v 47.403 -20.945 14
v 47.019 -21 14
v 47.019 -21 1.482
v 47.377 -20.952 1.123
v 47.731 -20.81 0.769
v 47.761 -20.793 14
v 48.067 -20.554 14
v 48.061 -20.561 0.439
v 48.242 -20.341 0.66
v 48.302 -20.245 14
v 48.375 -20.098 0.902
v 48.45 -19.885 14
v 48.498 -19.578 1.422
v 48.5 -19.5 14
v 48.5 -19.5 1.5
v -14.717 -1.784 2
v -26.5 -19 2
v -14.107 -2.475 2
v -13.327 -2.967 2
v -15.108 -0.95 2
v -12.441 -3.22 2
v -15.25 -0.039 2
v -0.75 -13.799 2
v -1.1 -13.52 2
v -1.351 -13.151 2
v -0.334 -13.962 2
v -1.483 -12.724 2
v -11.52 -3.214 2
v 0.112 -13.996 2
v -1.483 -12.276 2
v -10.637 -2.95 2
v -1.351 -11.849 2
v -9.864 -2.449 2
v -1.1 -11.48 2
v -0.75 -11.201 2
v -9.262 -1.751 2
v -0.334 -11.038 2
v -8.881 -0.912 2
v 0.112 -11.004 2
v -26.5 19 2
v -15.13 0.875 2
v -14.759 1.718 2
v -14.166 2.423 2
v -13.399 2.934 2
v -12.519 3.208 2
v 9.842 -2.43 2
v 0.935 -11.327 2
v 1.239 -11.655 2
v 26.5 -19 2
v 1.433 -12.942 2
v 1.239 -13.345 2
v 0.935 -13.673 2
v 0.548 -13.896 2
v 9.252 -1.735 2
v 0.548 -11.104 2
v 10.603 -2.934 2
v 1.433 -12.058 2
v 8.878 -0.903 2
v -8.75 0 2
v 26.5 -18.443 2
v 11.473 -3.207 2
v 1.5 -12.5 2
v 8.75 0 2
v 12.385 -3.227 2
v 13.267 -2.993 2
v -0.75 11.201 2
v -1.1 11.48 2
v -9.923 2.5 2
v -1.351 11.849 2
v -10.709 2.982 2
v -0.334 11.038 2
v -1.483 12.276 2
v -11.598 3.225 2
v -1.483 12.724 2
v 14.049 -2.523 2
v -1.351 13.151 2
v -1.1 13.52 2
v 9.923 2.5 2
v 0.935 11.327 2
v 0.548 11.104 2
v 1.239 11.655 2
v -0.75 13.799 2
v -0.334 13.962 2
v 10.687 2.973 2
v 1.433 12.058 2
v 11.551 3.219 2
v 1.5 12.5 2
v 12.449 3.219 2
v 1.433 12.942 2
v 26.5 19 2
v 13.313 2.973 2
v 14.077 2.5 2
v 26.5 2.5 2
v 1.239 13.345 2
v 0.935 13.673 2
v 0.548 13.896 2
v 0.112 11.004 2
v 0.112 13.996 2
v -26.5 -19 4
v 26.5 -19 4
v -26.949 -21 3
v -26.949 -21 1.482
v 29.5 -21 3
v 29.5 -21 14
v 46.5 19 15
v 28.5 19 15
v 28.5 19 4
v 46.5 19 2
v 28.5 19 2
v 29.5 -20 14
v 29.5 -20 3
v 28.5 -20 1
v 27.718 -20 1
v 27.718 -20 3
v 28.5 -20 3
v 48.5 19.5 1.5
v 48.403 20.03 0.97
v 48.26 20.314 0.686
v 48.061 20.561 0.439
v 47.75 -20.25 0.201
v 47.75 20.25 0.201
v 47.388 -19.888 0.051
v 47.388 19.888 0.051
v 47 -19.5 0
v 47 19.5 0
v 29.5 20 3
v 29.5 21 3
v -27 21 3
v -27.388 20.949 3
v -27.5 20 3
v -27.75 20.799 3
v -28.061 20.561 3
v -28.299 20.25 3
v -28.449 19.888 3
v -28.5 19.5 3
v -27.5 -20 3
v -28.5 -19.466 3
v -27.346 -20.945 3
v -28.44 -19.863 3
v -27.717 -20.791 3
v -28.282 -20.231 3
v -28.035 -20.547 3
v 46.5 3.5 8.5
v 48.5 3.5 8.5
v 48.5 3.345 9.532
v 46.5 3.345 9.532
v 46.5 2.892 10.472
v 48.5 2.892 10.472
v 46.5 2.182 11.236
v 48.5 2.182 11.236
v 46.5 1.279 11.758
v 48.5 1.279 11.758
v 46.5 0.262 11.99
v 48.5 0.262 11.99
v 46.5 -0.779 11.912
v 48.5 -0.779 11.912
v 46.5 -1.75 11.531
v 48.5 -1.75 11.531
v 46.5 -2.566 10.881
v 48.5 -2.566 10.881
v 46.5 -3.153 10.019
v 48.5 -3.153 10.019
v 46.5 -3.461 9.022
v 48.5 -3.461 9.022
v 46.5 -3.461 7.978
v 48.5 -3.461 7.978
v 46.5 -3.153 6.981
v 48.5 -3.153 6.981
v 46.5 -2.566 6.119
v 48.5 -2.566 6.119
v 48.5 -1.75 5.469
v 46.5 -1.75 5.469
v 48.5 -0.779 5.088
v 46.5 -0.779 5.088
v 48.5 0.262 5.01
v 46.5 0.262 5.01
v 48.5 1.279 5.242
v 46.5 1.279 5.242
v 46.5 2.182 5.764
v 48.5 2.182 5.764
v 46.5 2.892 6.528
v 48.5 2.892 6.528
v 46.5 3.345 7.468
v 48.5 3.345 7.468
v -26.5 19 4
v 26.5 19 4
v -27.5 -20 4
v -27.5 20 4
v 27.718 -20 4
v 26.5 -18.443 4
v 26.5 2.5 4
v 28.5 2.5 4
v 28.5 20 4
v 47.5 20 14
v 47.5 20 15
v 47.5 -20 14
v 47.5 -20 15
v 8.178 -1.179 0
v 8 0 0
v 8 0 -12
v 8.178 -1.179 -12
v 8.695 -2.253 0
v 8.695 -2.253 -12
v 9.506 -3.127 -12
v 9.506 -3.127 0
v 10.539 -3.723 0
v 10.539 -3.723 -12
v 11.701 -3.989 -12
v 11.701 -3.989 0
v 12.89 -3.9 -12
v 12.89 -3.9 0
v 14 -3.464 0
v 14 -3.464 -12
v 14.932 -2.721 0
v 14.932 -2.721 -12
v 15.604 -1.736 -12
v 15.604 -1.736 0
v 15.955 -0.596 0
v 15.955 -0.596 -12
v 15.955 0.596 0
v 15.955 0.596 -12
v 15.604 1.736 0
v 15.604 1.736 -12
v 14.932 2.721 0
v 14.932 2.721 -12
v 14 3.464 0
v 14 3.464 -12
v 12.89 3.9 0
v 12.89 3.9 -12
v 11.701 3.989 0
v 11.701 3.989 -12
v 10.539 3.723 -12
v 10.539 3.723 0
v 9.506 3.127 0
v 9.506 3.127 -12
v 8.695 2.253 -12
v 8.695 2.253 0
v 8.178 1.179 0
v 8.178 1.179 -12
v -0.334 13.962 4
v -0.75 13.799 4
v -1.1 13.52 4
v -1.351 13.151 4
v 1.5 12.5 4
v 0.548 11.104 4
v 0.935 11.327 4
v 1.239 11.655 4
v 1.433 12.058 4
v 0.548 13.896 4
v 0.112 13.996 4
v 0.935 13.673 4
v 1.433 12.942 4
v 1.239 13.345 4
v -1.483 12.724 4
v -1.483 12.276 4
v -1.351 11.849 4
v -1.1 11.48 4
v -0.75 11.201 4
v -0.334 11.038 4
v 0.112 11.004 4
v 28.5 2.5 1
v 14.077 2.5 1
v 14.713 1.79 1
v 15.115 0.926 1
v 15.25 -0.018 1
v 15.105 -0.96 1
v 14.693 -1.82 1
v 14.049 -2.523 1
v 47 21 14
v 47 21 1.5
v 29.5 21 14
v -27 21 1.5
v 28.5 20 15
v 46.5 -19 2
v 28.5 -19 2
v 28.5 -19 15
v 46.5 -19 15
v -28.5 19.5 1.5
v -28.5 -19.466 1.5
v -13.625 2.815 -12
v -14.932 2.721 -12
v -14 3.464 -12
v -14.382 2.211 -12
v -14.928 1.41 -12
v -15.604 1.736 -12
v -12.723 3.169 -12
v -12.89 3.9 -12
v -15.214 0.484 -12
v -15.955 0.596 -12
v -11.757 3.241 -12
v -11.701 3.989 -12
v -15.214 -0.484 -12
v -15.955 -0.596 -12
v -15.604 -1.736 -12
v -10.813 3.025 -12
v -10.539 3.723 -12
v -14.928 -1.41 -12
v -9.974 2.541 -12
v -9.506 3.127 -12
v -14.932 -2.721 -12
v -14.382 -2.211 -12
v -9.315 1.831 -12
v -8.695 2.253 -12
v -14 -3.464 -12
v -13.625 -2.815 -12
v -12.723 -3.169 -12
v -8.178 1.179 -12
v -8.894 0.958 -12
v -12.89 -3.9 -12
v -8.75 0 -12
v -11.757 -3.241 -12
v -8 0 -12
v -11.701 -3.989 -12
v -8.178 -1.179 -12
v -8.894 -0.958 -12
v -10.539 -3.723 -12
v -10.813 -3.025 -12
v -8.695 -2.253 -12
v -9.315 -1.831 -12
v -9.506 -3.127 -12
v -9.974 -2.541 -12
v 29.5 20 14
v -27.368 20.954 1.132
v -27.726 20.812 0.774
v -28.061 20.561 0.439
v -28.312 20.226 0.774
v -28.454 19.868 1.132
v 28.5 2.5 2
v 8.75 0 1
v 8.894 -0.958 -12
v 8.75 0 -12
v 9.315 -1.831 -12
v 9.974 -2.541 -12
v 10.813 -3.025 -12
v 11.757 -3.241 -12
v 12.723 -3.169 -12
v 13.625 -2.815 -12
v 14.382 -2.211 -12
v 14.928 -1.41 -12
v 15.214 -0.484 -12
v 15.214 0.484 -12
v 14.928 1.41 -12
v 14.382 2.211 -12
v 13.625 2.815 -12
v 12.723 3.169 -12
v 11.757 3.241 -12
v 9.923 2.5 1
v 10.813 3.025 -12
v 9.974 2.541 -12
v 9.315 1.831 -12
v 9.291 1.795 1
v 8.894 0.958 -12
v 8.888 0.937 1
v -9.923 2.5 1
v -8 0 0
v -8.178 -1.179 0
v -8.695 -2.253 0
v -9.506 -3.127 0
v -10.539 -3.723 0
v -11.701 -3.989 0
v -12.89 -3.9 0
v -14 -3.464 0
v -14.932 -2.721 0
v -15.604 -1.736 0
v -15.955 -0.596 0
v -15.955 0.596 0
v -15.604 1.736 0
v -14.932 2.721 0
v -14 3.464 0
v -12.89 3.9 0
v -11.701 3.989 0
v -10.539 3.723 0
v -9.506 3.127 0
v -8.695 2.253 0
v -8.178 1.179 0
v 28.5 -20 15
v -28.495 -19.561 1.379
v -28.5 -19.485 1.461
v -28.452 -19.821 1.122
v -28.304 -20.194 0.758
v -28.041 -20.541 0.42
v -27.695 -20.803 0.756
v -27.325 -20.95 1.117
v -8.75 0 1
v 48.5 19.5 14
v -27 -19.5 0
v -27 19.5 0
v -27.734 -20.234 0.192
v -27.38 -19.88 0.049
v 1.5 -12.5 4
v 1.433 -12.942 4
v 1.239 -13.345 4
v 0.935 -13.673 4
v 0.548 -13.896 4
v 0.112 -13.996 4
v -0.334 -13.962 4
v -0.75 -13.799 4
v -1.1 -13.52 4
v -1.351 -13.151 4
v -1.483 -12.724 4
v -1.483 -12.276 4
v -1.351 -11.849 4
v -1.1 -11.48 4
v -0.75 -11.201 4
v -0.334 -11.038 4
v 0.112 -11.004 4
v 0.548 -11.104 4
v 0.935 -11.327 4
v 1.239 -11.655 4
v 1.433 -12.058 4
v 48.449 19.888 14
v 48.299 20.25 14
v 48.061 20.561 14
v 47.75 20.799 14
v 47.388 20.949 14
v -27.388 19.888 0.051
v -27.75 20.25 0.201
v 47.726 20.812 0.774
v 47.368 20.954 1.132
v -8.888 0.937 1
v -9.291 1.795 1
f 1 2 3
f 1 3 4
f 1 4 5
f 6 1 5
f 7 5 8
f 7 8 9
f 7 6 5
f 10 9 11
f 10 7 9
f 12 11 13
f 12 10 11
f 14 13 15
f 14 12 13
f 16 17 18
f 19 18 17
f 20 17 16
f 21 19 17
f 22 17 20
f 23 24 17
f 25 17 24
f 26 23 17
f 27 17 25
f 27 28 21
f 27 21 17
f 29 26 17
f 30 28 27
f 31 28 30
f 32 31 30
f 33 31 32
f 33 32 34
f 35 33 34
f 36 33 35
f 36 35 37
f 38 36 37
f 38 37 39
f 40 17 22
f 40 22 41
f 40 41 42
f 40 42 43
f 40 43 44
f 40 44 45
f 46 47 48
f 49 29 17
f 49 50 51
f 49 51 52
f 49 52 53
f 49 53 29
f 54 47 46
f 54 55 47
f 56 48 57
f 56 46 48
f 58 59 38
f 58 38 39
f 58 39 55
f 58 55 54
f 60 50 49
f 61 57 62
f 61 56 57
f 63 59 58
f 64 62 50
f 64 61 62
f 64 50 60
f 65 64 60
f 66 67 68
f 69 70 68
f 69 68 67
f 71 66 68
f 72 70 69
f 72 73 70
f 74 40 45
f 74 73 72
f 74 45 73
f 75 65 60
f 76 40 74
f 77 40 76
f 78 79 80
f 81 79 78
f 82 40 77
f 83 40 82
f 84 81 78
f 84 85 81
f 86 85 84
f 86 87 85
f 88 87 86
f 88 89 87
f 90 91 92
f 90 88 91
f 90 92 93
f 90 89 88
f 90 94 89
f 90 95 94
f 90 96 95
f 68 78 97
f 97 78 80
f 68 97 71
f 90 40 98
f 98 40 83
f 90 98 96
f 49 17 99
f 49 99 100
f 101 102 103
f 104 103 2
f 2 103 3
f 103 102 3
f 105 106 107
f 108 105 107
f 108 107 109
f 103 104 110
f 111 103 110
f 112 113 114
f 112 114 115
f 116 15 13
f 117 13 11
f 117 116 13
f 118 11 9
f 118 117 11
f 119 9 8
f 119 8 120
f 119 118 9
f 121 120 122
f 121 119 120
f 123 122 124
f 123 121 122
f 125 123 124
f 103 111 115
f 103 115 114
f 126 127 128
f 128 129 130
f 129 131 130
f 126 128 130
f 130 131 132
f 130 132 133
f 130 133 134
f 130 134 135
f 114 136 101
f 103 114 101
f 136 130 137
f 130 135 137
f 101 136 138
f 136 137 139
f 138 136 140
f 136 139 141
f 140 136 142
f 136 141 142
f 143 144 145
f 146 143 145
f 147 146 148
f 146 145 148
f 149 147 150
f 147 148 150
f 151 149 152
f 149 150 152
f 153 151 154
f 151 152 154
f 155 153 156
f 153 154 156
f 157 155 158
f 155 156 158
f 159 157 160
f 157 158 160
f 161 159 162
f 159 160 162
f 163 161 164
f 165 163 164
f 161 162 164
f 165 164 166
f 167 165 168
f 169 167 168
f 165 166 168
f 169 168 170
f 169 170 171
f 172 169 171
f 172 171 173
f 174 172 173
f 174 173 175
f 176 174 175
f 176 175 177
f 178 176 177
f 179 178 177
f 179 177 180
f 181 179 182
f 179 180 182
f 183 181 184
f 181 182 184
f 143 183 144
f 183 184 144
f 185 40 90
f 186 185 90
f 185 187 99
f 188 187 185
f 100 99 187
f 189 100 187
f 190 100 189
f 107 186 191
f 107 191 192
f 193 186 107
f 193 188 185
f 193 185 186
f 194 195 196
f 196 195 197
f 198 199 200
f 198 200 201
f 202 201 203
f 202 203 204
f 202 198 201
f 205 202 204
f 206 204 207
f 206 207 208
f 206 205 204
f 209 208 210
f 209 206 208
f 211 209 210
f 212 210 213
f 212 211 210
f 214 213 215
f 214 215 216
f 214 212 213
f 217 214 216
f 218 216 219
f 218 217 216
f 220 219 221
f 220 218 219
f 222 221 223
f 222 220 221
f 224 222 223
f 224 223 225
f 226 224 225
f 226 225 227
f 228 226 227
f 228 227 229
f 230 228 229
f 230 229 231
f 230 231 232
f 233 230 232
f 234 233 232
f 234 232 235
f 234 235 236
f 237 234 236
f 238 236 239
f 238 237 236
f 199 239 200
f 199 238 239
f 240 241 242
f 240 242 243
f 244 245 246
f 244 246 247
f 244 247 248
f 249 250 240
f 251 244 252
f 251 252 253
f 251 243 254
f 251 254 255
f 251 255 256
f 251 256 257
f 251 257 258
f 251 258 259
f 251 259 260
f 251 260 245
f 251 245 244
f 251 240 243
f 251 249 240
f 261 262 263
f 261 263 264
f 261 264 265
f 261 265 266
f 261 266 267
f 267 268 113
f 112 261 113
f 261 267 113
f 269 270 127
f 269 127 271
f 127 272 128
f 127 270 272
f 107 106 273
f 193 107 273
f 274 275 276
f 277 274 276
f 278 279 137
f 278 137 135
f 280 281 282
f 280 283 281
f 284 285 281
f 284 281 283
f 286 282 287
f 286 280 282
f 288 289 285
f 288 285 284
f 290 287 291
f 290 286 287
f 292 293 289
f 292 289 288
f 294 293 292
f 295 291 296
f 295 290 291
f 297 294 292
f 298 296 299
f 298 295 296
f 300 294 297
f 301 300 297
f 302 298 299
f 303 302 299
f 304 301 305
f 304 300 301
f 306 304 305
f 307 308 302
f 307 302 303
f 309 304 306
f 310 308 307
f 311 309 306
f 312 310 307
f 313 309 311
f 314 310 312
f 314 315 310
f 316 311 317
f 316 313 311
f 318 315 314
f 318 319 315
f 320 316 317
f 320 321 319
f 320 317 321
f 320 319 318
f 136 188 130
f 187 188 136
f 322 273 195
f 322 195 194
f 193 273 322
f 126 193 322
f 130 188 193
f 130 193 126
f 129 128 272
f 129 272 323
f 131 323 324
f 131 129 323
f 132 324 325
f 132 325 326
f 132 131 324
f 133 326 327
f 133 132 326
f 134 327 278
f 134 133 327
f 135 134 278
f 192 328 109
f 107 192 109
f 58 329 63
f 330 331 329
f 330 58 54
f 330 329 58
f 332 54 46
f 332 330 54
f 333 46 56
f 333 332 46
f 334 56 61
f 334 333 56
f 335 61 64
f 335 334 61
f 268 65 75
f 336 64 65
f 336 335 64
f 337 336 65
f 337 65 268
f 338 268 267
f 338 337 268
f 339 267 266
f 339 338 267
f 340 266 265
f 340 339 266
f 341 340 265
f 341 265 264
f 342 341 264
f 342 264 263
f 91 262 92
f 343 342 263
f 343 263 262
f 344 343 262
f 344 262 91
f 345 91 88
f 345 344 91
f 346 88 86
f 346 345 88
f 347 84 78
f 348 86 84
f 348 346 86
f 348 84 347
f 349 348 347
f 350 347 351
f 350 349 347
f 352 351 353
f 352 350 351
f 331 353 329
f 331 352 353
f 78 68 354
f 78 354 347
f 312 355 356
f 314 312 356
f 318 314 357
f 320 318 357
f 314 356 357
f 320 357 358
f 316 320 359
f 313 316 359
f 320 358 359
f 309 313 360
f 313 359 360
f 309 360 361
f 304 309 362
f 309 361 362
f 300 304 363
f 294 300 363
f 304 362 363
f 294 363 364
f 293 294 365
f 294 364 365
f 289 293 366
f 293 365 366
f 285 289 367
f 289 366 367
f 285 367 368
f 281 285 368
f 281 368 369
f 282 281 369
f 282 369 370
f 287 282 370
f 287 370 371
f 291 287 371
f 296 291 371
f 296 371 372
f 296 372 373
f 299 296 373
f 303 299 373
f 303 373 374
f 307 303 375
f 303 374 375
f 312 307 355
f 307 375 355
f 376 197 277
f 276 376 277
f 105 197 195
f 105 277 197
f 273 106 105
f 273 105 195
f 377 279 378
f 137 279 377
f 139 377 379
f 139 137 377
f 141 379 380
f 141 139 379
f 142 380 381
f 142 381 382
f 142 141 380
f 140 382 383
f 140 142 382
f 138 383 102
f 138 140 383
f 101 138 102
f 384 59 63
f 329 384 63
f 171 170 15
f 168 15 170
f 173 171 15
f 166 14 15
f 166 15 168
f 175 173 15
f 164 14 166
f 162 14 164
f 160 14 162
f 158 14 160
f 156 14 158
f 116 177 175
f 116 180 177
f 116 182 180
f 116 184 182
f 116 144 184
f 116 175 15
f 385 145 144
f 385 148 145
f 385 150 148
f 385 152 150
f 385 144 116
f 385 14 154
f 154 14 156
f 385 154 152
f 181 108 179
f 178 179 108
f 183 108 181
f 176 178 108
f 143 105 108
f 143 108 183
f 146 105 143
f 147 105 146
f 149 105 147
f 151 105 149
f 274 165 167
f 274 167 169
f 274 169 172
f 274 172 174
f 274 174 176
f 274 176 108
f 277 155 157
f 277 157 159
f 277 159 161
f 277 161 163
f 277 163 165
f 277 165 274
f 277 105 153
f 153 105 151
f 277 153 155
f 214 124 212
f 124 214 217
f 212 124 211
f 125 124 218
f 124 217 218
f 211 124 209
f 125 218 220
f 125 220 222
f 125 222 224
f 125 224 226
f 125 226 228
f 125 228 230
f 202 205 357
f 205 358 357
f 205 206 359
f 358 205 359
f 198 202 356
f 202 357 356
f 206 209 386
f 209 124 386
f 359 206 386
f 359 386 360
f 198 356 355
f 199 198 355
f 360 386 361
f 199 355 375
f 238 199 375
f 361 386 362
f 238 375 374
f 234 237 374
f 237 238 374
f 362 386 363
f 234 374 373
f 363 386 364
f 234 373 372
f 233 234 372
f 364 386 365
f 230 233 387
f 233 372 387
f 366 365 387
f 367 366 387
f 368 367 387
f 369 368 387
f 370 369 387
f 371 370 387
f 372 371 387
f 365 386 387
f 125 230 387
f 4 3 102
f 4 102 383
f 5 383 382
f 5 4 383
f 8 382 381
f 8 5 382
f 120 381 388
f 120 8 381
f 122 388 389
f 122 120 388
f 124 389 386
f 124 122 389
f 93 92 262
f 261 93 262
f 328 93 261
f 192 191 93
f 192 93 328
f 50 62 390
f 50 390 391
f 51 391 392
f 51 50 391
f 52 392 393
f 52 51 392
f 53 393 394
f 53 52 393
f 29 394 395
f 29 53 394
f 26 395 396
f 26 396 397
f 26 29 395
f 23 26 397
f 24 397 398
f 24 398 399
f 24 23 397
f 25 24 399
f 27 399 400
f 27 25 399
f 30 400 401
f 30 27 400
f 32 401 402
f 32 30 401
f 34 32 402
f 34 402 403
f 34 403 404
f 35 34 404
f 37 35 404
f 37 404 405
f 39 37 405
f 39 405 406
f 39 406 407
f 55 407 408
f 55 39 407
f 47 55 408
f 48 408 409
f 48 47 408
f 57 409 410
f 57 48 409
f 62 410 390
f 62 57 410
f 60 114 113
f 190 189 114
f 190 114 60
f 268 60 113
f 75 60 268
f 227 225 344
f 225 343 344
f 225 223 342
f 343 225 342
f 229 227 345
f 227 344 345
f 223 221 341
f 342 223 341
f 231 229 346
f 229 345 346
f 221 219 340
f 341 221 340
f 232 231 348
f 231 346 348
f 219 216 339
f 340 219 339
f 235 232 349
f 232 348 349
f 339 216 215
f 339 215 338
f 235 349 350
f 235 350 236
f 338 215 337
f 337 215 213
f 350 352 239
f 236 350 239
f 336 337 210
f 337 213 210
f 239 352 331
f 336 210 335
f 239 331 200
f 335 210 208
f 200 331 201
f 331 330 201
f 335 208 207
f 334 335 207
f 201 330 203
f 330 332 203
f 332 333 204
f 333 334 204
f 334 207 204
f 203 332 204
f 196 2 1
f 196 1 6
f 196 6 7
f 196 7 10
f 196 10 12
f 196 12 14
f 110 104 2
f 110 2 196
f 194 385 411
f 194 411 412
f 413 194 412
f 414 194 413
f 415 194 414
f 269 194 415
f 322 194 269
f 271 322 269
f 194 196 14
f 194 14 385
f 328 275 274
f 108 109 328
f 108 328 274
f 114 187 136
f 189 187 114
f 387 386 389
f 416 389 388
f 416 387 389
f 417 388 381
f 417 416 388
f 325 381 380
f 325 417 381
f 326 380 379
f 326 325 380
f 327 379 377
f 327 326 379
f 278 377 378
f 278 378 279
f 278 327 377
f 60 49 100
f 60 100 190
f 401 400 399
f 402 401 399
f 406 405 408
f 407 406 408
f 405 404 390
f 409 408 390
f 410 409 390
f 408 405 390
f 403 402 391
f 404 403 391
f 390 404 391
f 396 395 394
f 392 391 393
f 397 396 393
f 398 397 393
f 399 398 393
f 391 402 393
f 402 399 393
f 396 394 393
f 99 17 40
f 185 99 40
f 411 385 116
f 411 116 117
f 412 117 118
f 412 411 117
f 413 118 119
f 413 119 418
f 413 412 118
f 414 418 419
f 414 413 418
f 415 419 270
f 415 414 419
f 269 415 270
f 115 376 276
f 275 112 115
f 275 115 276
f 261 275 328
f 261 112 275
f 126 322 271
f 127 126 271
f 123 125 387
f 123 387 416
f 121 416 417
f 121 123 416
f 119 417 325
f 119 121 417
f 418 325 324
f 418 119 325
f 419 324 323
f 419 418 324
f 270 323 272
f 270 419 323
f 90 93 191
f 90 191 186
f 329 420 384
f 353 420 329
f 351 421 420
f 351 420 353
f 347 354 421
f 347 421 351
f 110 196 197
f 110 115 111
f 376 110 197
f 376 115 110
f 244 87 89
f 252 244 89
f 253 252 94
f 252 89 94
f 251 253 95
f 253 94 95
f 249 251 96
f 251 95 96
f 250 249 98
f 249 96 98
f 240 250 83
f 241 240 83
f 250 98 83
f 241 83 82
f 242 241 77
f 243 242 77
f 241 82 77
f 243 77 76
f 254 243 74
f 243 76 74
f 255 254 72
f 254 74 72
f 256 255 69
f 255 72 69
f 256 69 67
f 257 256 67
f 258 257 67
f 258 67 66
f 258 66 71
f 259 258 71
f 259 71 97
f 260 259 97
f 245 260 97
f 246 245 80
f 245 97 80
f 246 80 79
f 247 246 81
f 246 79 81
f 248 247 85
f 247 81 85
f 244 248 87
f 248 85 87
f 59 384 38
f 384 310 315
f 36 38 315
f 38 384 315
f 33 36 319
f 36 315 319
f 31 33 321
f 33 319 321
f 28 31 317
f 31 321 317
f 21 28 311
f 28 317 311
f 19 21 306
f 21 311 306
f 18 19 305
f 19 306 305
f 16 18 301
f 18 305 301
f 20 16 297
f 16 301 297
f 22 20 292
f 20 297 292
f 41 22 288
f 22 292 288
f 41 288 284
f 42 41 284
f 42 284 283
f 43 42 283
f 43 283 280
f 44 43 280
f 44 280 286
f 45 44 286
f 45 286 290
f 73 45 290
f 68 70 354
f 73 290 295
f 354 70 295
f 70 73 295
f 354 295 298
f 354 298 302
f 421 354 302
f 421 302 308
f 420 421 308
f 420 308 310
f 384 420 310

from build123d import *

# Parameters (mm, degrees)
SKETCH_W        = 57
SKETCH_H        = 42
PAD_DEPTH       = 2
SKETCH001_W     = 57
SKETCH001_H     = 42
SKETCH001_W_2   = 53
SKETCH001_H_2   = 38
PAD001_DEPTH    = 2
SKETCH002_R     = 4
PAD002_DEPTH    = 12
SKETCH003_R     = 3.25
POCKET_DEPTH    = 14
SKETCH004_R     = 1.5
PAD003_DEPTH    = 2
POCKET001_DEPTH = 3
SKETCH006_W     = 26.076656
SKETCH006_H     = 2.5
POCKET002_DEPTH = 1
POCKET003_DEPTH = 1
PAD004_DEPTH    = 1
PAD005_DEPTH    = 17
PAD006_DEPTH    = 1
SKETCH011_W     = 42
SKETCH011_H     = 14
PAD007_DEPTH    = 1
SKETCH012_R     = 3.5
POCKET004_DEPTH = 2
SKETCH013_W     = 18
SKETCH013_H     = 38
PAD008_DEPTH    = 1
SKETCH014_W     = 0.782134
SKETCH014_H     = 1
PAD009_DEPTH    = 2
POCKET005_DEPTH = 15
POCKET006_DEPTH = 15
POCKET007_DEPTH = 3
POCKET008_DEPTH = 3
POCKET009_DEPTH = 80
POCKET010_DEPTH = 80
POCKET011_DEPTH = 42
POCKET012_DEPTH = 42


with BuildPart() as part:
    # Sketch → Pad (new body)
    with BuildSketch(Plane.XY):
        Rectangle(SKETCH_W, SKETCH_H)
    extrude(amount=PAD_DEPTH)

    # Sketch001 (on Face6 of Pad) → Pad001 (join)
    with BuildSketch(Plane.XY.offset(2)):
        Rectangle(SKETCH001_W, SKETCH001_H)
        Rectangle(SKETCH001_W_2, SKETCH001_H_2, mode=Mode.SUBTRACT)
    extrude(amount=PAD001_DEPTH)

    # Sketch002 (on Face4 of Pad001) → Pad002 (join)
    with BuildSketch(Plane(origin=(0, 0, 0), x_dir=(1, 0, 0), z_dir=(0, 0, -1))):
        with Locations((-12, 0)):
            Circle(SKETCH002_R)
    pad002 = extrude(amount=PAD002_DEPTH)

    # Sketch003 (on Face12 of Pad002) → Pocket (cut)
    with BuildSketch(Plane(origin=(0, 0, -12), x_dir=(1, 0, 0), z_dir=(0, 0, -1))):
        with Locations((-12, 0)):
            Circle(SKETCH003_R)
    pocket = extrude(amount=-POCKET_DEPTH, mode=Mode.SUBTRACT)

    # Mirrored: Pad002 across Sketch002 V_Axis
    add(pad002.mirror(Plane(origin=(0, 0, 0), x_dir=(0, 0, -1), z_dir=(1, 0, 0))))

    # Mirrored001: Pocket across Sketch003 V_Axis
    add(pocket.mirror(Plane(origin=(0, 0, -12), x_dir=(0, 0, -1), z_dir=(1, 0, 0))), mode=Mode.SUBTRACT)

    # Sketch004 (on Face21 of Mirrored001) → Pad003 (join)
    with BuildSketch(Plane.XY.offset(2)):
        with Locations((0, 12.5)):
            Circle(SKETCH004_R)
    pad003 = extrude(amount=PAD003_DEPTH)

    # Mirrored002: Pad003 across Sketch004 H_Axis
    add(pad003.mirror(Plane(origin=(0, 0, 2), x_dir=(0, 0, 1), z_dir=(0, 1, 0))))

    # Sketch005 (on Face21 of Mirrored002) → Pocket001 (cut)
    with BuildSketch(Plane.XY.offset(4)):
        with BuildLine():
            ThreePointArc((14.048565, -2.52307), (15.249949, -0.018175), (14.076656, 2.5))
            Line((14.076656, 2.5), (28.5, 2.5))
            Line((28.5, 2.5), (28.5, -21))
            Line((28.5, -21), (14.048565, -2.52307))
        make_face()
    extrude(amount=-POCKET001_DEPTH, mode=Mode.SUBTRACT)

    # Sketch006 (on Face17 of Pocket001) → Pocket002 (cut)
    with BuildSketch(Plane.XY.offset(2)):
        with Locations((1.038328, 1.25)):
            Rectangle(SKETCH006_W, SKETCH006_H)
    extrude(amount=-POCKET002_DEPTH, mode=Mode.SUBTRACT)

    # Sketch007 (on Face13 of Pocket002) → Pocket003 (cut)
    with BuildSketch(Plane.XY.offset(4)):
        Polygon((28.5, 21), (28.5, 20), (-27.5, 20), (-27.5, -20), (28.5, -20), (28.5, -21), (-28.5, -21), (-28.5, 21), align=None)
    extrude(amount=-POCKET003_DEPTH, mode=Mode.SUBTRACT)

    # Sketch008 (on Face3 of Pocket003) → Pad004 (join)
    with BuildSketch(Plane.YZ.offset(28.5)):
        Polygon((-19, 1), (-19, 15), (-20, 15), (-20, 4), (-20, 3), (-21, 3), (-21, 0), (21, 0), (21, 3), (20, 3), (20, 15), (19, 15), (19, 1), align=None)
    extrude(amount=PAD004_DEPTH)

    # Sketch009 (on Face10 of Pad004) → Pad005 (join)
    with BuildSketch(Plane.YZ.offset(29.5)):
        Polygon((-19, 15), (-20, 15), (-20, 14), (-21, 14), (-21, 0), (21, 0), (21, 14), (20, 14), (20, 15), (19, 15), (19, 1), (-19, 1), align=None)
    extrude(amount=PAD005_DEPTH)

    # Sketch010 (on Face20 of Pad005) → Pad006 (join)
    with BuildSketch(Plane.YZ.offset(46.5)):
        Polygon((-20, 15), (20, 15), (20, 14), (21, 14), (21, 0), (-21, 0), (-21, 14), (-20, 14), align=None)
    extrude(amount=PAD006_DEPTH)

    # Sketch011 (on Face34 of Pad006) → Pad007 (join)
    with BuildSketch(Plane.YZ.offset(47.5)):
        with Locations((0, 7)):
            Rectangle(SKETCH011_W, SKETCH011_H)
    extrude(amount=PAD007_DEPTH)

    # Sketch012 (on Face51 of Pad007) → Pocket004 (cut)
    with BuildSketch(Plane.YZ.offset(48.5)):
        with Locations((0, 8.5)):
            Circle(SKETCH012_R)
    extrude(amount=-POCKET004_DEPTH, mode=Mode.SUBTRACT)

    # Sketch013 (on Face77 of Pocket004) → Pad008 (join)
    with BuildSketch(Plane.XY.offset(1)):
        with Locations((37.5, 0)):
            Rectangle(SKETCH013_W, SKETCH013_H)
    extrude(amount=PAD008_DEPTH)

    # Sketch014 (on Face40 of Pad008) → Pad009 (join)
    with BuildSketch(Plane.XY.offset(1)):
        with Locations((28.108933, -20.5)):
            Rectangle(SKETCH014_W, SKETCH014_H)
    extrude(amount=PAD009_DEPTH)

    # Sketch015 (on Face50 of Pad009) → Pocket005 (cut)
    with BuildSketch(Plane.XY.offset(14)):
        with BuildLine():
            ThreePointArc((47.018921, -21), (48.067334, -20.554064), (48.5, -19.500105))
            Line((48.5, -19.500105), (48.5, -21))
            Line((48.5, -21), (47.018921, -21))
        make_face()
    extrude(amount=-POCKET005_DEPTH, mode=Mode.SUBTRACT)

    # Sketch016 (on Face51 of Pocket005) → Pocket006 (cut)
    with BuildSketch(Plane.XY.offset(14)):
        with BuildLine():
            ThreePointArc((48.5, 19.5), (48.060658, 20.560658), (47, 21))
            Line((47, 21), (48.5, 21))
            Line((48.5, 21), (48.5, 19.5))
        make_face()
    extrude(amount=-POCKET006_DEPTH, mode=Mode.SUBTRACT)

    # Sketch017 (on Face13 of Pocket006) → Pocket007 (cut)
    with BuildSketch(Plane.XY.offset(3)):
        with BuildLine():
            ThreePointArc((-27, 21), (-28.060664, 20.560656), (-28.5, 19.499989))
            Line((-28.5, 21), (-28.5, 19.499989))
            Line((-27, 21), (-28.5, 21))
        make_face()
    extrude(amount=-POCKET007_DEPTH, mode=Mode.SUBTRACT)

    # Sketch018 (on Face13 of Pocket007) → Pocket008 (cut)
    with BuildSketch(Plane.XY.offset(3)):
        with BuildLine():
            ThreePointArc((-28.5, -19.466143), (-28.035422, -20.547385), (-26.949118, -21))
            Line((-28.5, -21), (-26.949118, -21))
            Line((-28.5, -19.466143), (-28.5, -21))
        make_face()
    extrude(amount=-POCKET008_DEPTH, mode=Mode.SUBTRACT)

    # Sketch019 (on Face60 of Pocket008) → Pocket009 (cut)
    with BuildSketch(Plane.YZ.offset(48.5)):
        with BuildLine():
            Line((-21.000105, 1.5), (-21.000105, 0))
            Line((-21.000105, 0), (-19.500105, 0))
            ThreePointArc((-21.000105, 1.5), (-20.560765, 0.43934), (-19.500105, 0))
        make_face()
    extrude(amount=-POCKET009_DEPTH, mode=Mode.SUBTRACT)

    # Sketch020 (on Face36 of Pocket009) → Pocket010 (cut)
    with BuildSketch(Plane.YZ.offset(48.5)):
        with BuildLine():
            Line((19.5, 0), (21, 0))
            Line((21, 0), (21, 1.5))
            ThreePointArc((19.5, 0), (20.56066, 0.43934), (21, 1.5))
        make_face()
    extrude(amount=-POCKET010_DEPTH, mode=Mode.SUBTRACT)

    # Sketch021 (on Face13 of Pocket010) → Pocket011 (cut)
    with BuildSketch(Plane(origin=(0, 21, 0), x_dir=(-1, 0, 0), z_dir=(0, 1, 0))):
        with BuildLine():
            Line((-48.5, 1.5), (-48.5, 0))
            Line((-47, 0), (-48.5, 0))
            ThreePointArc((-48.5, 1.5), (-48.06066, 0.43934), (-47, 0))
        make_face()
    extrude(amount=-POCKET011_DEPTH, mode=Mode.SUBTRACT)

    # Sketch022 (on Face4 of Pocket011) → Pocket012 (cut)
    with BuildSketch(Plane(origin=(0, 21, 0), x_dir=(-1, 0, 0), z_dir=(0, 1, 0))):
        with BuildLine():
            Line((28.5, 1.5), (28.5, 0))
            Line((28.5, 0), (27, 0))
            ThreePointArc((27, 0), (28.06066, 0.43934), (28.5, 1.5))
        make_face()
    extrude(amount=-POCKET012_DEPTH, mode=Mode.SUBTRACT)


solid = part.part
